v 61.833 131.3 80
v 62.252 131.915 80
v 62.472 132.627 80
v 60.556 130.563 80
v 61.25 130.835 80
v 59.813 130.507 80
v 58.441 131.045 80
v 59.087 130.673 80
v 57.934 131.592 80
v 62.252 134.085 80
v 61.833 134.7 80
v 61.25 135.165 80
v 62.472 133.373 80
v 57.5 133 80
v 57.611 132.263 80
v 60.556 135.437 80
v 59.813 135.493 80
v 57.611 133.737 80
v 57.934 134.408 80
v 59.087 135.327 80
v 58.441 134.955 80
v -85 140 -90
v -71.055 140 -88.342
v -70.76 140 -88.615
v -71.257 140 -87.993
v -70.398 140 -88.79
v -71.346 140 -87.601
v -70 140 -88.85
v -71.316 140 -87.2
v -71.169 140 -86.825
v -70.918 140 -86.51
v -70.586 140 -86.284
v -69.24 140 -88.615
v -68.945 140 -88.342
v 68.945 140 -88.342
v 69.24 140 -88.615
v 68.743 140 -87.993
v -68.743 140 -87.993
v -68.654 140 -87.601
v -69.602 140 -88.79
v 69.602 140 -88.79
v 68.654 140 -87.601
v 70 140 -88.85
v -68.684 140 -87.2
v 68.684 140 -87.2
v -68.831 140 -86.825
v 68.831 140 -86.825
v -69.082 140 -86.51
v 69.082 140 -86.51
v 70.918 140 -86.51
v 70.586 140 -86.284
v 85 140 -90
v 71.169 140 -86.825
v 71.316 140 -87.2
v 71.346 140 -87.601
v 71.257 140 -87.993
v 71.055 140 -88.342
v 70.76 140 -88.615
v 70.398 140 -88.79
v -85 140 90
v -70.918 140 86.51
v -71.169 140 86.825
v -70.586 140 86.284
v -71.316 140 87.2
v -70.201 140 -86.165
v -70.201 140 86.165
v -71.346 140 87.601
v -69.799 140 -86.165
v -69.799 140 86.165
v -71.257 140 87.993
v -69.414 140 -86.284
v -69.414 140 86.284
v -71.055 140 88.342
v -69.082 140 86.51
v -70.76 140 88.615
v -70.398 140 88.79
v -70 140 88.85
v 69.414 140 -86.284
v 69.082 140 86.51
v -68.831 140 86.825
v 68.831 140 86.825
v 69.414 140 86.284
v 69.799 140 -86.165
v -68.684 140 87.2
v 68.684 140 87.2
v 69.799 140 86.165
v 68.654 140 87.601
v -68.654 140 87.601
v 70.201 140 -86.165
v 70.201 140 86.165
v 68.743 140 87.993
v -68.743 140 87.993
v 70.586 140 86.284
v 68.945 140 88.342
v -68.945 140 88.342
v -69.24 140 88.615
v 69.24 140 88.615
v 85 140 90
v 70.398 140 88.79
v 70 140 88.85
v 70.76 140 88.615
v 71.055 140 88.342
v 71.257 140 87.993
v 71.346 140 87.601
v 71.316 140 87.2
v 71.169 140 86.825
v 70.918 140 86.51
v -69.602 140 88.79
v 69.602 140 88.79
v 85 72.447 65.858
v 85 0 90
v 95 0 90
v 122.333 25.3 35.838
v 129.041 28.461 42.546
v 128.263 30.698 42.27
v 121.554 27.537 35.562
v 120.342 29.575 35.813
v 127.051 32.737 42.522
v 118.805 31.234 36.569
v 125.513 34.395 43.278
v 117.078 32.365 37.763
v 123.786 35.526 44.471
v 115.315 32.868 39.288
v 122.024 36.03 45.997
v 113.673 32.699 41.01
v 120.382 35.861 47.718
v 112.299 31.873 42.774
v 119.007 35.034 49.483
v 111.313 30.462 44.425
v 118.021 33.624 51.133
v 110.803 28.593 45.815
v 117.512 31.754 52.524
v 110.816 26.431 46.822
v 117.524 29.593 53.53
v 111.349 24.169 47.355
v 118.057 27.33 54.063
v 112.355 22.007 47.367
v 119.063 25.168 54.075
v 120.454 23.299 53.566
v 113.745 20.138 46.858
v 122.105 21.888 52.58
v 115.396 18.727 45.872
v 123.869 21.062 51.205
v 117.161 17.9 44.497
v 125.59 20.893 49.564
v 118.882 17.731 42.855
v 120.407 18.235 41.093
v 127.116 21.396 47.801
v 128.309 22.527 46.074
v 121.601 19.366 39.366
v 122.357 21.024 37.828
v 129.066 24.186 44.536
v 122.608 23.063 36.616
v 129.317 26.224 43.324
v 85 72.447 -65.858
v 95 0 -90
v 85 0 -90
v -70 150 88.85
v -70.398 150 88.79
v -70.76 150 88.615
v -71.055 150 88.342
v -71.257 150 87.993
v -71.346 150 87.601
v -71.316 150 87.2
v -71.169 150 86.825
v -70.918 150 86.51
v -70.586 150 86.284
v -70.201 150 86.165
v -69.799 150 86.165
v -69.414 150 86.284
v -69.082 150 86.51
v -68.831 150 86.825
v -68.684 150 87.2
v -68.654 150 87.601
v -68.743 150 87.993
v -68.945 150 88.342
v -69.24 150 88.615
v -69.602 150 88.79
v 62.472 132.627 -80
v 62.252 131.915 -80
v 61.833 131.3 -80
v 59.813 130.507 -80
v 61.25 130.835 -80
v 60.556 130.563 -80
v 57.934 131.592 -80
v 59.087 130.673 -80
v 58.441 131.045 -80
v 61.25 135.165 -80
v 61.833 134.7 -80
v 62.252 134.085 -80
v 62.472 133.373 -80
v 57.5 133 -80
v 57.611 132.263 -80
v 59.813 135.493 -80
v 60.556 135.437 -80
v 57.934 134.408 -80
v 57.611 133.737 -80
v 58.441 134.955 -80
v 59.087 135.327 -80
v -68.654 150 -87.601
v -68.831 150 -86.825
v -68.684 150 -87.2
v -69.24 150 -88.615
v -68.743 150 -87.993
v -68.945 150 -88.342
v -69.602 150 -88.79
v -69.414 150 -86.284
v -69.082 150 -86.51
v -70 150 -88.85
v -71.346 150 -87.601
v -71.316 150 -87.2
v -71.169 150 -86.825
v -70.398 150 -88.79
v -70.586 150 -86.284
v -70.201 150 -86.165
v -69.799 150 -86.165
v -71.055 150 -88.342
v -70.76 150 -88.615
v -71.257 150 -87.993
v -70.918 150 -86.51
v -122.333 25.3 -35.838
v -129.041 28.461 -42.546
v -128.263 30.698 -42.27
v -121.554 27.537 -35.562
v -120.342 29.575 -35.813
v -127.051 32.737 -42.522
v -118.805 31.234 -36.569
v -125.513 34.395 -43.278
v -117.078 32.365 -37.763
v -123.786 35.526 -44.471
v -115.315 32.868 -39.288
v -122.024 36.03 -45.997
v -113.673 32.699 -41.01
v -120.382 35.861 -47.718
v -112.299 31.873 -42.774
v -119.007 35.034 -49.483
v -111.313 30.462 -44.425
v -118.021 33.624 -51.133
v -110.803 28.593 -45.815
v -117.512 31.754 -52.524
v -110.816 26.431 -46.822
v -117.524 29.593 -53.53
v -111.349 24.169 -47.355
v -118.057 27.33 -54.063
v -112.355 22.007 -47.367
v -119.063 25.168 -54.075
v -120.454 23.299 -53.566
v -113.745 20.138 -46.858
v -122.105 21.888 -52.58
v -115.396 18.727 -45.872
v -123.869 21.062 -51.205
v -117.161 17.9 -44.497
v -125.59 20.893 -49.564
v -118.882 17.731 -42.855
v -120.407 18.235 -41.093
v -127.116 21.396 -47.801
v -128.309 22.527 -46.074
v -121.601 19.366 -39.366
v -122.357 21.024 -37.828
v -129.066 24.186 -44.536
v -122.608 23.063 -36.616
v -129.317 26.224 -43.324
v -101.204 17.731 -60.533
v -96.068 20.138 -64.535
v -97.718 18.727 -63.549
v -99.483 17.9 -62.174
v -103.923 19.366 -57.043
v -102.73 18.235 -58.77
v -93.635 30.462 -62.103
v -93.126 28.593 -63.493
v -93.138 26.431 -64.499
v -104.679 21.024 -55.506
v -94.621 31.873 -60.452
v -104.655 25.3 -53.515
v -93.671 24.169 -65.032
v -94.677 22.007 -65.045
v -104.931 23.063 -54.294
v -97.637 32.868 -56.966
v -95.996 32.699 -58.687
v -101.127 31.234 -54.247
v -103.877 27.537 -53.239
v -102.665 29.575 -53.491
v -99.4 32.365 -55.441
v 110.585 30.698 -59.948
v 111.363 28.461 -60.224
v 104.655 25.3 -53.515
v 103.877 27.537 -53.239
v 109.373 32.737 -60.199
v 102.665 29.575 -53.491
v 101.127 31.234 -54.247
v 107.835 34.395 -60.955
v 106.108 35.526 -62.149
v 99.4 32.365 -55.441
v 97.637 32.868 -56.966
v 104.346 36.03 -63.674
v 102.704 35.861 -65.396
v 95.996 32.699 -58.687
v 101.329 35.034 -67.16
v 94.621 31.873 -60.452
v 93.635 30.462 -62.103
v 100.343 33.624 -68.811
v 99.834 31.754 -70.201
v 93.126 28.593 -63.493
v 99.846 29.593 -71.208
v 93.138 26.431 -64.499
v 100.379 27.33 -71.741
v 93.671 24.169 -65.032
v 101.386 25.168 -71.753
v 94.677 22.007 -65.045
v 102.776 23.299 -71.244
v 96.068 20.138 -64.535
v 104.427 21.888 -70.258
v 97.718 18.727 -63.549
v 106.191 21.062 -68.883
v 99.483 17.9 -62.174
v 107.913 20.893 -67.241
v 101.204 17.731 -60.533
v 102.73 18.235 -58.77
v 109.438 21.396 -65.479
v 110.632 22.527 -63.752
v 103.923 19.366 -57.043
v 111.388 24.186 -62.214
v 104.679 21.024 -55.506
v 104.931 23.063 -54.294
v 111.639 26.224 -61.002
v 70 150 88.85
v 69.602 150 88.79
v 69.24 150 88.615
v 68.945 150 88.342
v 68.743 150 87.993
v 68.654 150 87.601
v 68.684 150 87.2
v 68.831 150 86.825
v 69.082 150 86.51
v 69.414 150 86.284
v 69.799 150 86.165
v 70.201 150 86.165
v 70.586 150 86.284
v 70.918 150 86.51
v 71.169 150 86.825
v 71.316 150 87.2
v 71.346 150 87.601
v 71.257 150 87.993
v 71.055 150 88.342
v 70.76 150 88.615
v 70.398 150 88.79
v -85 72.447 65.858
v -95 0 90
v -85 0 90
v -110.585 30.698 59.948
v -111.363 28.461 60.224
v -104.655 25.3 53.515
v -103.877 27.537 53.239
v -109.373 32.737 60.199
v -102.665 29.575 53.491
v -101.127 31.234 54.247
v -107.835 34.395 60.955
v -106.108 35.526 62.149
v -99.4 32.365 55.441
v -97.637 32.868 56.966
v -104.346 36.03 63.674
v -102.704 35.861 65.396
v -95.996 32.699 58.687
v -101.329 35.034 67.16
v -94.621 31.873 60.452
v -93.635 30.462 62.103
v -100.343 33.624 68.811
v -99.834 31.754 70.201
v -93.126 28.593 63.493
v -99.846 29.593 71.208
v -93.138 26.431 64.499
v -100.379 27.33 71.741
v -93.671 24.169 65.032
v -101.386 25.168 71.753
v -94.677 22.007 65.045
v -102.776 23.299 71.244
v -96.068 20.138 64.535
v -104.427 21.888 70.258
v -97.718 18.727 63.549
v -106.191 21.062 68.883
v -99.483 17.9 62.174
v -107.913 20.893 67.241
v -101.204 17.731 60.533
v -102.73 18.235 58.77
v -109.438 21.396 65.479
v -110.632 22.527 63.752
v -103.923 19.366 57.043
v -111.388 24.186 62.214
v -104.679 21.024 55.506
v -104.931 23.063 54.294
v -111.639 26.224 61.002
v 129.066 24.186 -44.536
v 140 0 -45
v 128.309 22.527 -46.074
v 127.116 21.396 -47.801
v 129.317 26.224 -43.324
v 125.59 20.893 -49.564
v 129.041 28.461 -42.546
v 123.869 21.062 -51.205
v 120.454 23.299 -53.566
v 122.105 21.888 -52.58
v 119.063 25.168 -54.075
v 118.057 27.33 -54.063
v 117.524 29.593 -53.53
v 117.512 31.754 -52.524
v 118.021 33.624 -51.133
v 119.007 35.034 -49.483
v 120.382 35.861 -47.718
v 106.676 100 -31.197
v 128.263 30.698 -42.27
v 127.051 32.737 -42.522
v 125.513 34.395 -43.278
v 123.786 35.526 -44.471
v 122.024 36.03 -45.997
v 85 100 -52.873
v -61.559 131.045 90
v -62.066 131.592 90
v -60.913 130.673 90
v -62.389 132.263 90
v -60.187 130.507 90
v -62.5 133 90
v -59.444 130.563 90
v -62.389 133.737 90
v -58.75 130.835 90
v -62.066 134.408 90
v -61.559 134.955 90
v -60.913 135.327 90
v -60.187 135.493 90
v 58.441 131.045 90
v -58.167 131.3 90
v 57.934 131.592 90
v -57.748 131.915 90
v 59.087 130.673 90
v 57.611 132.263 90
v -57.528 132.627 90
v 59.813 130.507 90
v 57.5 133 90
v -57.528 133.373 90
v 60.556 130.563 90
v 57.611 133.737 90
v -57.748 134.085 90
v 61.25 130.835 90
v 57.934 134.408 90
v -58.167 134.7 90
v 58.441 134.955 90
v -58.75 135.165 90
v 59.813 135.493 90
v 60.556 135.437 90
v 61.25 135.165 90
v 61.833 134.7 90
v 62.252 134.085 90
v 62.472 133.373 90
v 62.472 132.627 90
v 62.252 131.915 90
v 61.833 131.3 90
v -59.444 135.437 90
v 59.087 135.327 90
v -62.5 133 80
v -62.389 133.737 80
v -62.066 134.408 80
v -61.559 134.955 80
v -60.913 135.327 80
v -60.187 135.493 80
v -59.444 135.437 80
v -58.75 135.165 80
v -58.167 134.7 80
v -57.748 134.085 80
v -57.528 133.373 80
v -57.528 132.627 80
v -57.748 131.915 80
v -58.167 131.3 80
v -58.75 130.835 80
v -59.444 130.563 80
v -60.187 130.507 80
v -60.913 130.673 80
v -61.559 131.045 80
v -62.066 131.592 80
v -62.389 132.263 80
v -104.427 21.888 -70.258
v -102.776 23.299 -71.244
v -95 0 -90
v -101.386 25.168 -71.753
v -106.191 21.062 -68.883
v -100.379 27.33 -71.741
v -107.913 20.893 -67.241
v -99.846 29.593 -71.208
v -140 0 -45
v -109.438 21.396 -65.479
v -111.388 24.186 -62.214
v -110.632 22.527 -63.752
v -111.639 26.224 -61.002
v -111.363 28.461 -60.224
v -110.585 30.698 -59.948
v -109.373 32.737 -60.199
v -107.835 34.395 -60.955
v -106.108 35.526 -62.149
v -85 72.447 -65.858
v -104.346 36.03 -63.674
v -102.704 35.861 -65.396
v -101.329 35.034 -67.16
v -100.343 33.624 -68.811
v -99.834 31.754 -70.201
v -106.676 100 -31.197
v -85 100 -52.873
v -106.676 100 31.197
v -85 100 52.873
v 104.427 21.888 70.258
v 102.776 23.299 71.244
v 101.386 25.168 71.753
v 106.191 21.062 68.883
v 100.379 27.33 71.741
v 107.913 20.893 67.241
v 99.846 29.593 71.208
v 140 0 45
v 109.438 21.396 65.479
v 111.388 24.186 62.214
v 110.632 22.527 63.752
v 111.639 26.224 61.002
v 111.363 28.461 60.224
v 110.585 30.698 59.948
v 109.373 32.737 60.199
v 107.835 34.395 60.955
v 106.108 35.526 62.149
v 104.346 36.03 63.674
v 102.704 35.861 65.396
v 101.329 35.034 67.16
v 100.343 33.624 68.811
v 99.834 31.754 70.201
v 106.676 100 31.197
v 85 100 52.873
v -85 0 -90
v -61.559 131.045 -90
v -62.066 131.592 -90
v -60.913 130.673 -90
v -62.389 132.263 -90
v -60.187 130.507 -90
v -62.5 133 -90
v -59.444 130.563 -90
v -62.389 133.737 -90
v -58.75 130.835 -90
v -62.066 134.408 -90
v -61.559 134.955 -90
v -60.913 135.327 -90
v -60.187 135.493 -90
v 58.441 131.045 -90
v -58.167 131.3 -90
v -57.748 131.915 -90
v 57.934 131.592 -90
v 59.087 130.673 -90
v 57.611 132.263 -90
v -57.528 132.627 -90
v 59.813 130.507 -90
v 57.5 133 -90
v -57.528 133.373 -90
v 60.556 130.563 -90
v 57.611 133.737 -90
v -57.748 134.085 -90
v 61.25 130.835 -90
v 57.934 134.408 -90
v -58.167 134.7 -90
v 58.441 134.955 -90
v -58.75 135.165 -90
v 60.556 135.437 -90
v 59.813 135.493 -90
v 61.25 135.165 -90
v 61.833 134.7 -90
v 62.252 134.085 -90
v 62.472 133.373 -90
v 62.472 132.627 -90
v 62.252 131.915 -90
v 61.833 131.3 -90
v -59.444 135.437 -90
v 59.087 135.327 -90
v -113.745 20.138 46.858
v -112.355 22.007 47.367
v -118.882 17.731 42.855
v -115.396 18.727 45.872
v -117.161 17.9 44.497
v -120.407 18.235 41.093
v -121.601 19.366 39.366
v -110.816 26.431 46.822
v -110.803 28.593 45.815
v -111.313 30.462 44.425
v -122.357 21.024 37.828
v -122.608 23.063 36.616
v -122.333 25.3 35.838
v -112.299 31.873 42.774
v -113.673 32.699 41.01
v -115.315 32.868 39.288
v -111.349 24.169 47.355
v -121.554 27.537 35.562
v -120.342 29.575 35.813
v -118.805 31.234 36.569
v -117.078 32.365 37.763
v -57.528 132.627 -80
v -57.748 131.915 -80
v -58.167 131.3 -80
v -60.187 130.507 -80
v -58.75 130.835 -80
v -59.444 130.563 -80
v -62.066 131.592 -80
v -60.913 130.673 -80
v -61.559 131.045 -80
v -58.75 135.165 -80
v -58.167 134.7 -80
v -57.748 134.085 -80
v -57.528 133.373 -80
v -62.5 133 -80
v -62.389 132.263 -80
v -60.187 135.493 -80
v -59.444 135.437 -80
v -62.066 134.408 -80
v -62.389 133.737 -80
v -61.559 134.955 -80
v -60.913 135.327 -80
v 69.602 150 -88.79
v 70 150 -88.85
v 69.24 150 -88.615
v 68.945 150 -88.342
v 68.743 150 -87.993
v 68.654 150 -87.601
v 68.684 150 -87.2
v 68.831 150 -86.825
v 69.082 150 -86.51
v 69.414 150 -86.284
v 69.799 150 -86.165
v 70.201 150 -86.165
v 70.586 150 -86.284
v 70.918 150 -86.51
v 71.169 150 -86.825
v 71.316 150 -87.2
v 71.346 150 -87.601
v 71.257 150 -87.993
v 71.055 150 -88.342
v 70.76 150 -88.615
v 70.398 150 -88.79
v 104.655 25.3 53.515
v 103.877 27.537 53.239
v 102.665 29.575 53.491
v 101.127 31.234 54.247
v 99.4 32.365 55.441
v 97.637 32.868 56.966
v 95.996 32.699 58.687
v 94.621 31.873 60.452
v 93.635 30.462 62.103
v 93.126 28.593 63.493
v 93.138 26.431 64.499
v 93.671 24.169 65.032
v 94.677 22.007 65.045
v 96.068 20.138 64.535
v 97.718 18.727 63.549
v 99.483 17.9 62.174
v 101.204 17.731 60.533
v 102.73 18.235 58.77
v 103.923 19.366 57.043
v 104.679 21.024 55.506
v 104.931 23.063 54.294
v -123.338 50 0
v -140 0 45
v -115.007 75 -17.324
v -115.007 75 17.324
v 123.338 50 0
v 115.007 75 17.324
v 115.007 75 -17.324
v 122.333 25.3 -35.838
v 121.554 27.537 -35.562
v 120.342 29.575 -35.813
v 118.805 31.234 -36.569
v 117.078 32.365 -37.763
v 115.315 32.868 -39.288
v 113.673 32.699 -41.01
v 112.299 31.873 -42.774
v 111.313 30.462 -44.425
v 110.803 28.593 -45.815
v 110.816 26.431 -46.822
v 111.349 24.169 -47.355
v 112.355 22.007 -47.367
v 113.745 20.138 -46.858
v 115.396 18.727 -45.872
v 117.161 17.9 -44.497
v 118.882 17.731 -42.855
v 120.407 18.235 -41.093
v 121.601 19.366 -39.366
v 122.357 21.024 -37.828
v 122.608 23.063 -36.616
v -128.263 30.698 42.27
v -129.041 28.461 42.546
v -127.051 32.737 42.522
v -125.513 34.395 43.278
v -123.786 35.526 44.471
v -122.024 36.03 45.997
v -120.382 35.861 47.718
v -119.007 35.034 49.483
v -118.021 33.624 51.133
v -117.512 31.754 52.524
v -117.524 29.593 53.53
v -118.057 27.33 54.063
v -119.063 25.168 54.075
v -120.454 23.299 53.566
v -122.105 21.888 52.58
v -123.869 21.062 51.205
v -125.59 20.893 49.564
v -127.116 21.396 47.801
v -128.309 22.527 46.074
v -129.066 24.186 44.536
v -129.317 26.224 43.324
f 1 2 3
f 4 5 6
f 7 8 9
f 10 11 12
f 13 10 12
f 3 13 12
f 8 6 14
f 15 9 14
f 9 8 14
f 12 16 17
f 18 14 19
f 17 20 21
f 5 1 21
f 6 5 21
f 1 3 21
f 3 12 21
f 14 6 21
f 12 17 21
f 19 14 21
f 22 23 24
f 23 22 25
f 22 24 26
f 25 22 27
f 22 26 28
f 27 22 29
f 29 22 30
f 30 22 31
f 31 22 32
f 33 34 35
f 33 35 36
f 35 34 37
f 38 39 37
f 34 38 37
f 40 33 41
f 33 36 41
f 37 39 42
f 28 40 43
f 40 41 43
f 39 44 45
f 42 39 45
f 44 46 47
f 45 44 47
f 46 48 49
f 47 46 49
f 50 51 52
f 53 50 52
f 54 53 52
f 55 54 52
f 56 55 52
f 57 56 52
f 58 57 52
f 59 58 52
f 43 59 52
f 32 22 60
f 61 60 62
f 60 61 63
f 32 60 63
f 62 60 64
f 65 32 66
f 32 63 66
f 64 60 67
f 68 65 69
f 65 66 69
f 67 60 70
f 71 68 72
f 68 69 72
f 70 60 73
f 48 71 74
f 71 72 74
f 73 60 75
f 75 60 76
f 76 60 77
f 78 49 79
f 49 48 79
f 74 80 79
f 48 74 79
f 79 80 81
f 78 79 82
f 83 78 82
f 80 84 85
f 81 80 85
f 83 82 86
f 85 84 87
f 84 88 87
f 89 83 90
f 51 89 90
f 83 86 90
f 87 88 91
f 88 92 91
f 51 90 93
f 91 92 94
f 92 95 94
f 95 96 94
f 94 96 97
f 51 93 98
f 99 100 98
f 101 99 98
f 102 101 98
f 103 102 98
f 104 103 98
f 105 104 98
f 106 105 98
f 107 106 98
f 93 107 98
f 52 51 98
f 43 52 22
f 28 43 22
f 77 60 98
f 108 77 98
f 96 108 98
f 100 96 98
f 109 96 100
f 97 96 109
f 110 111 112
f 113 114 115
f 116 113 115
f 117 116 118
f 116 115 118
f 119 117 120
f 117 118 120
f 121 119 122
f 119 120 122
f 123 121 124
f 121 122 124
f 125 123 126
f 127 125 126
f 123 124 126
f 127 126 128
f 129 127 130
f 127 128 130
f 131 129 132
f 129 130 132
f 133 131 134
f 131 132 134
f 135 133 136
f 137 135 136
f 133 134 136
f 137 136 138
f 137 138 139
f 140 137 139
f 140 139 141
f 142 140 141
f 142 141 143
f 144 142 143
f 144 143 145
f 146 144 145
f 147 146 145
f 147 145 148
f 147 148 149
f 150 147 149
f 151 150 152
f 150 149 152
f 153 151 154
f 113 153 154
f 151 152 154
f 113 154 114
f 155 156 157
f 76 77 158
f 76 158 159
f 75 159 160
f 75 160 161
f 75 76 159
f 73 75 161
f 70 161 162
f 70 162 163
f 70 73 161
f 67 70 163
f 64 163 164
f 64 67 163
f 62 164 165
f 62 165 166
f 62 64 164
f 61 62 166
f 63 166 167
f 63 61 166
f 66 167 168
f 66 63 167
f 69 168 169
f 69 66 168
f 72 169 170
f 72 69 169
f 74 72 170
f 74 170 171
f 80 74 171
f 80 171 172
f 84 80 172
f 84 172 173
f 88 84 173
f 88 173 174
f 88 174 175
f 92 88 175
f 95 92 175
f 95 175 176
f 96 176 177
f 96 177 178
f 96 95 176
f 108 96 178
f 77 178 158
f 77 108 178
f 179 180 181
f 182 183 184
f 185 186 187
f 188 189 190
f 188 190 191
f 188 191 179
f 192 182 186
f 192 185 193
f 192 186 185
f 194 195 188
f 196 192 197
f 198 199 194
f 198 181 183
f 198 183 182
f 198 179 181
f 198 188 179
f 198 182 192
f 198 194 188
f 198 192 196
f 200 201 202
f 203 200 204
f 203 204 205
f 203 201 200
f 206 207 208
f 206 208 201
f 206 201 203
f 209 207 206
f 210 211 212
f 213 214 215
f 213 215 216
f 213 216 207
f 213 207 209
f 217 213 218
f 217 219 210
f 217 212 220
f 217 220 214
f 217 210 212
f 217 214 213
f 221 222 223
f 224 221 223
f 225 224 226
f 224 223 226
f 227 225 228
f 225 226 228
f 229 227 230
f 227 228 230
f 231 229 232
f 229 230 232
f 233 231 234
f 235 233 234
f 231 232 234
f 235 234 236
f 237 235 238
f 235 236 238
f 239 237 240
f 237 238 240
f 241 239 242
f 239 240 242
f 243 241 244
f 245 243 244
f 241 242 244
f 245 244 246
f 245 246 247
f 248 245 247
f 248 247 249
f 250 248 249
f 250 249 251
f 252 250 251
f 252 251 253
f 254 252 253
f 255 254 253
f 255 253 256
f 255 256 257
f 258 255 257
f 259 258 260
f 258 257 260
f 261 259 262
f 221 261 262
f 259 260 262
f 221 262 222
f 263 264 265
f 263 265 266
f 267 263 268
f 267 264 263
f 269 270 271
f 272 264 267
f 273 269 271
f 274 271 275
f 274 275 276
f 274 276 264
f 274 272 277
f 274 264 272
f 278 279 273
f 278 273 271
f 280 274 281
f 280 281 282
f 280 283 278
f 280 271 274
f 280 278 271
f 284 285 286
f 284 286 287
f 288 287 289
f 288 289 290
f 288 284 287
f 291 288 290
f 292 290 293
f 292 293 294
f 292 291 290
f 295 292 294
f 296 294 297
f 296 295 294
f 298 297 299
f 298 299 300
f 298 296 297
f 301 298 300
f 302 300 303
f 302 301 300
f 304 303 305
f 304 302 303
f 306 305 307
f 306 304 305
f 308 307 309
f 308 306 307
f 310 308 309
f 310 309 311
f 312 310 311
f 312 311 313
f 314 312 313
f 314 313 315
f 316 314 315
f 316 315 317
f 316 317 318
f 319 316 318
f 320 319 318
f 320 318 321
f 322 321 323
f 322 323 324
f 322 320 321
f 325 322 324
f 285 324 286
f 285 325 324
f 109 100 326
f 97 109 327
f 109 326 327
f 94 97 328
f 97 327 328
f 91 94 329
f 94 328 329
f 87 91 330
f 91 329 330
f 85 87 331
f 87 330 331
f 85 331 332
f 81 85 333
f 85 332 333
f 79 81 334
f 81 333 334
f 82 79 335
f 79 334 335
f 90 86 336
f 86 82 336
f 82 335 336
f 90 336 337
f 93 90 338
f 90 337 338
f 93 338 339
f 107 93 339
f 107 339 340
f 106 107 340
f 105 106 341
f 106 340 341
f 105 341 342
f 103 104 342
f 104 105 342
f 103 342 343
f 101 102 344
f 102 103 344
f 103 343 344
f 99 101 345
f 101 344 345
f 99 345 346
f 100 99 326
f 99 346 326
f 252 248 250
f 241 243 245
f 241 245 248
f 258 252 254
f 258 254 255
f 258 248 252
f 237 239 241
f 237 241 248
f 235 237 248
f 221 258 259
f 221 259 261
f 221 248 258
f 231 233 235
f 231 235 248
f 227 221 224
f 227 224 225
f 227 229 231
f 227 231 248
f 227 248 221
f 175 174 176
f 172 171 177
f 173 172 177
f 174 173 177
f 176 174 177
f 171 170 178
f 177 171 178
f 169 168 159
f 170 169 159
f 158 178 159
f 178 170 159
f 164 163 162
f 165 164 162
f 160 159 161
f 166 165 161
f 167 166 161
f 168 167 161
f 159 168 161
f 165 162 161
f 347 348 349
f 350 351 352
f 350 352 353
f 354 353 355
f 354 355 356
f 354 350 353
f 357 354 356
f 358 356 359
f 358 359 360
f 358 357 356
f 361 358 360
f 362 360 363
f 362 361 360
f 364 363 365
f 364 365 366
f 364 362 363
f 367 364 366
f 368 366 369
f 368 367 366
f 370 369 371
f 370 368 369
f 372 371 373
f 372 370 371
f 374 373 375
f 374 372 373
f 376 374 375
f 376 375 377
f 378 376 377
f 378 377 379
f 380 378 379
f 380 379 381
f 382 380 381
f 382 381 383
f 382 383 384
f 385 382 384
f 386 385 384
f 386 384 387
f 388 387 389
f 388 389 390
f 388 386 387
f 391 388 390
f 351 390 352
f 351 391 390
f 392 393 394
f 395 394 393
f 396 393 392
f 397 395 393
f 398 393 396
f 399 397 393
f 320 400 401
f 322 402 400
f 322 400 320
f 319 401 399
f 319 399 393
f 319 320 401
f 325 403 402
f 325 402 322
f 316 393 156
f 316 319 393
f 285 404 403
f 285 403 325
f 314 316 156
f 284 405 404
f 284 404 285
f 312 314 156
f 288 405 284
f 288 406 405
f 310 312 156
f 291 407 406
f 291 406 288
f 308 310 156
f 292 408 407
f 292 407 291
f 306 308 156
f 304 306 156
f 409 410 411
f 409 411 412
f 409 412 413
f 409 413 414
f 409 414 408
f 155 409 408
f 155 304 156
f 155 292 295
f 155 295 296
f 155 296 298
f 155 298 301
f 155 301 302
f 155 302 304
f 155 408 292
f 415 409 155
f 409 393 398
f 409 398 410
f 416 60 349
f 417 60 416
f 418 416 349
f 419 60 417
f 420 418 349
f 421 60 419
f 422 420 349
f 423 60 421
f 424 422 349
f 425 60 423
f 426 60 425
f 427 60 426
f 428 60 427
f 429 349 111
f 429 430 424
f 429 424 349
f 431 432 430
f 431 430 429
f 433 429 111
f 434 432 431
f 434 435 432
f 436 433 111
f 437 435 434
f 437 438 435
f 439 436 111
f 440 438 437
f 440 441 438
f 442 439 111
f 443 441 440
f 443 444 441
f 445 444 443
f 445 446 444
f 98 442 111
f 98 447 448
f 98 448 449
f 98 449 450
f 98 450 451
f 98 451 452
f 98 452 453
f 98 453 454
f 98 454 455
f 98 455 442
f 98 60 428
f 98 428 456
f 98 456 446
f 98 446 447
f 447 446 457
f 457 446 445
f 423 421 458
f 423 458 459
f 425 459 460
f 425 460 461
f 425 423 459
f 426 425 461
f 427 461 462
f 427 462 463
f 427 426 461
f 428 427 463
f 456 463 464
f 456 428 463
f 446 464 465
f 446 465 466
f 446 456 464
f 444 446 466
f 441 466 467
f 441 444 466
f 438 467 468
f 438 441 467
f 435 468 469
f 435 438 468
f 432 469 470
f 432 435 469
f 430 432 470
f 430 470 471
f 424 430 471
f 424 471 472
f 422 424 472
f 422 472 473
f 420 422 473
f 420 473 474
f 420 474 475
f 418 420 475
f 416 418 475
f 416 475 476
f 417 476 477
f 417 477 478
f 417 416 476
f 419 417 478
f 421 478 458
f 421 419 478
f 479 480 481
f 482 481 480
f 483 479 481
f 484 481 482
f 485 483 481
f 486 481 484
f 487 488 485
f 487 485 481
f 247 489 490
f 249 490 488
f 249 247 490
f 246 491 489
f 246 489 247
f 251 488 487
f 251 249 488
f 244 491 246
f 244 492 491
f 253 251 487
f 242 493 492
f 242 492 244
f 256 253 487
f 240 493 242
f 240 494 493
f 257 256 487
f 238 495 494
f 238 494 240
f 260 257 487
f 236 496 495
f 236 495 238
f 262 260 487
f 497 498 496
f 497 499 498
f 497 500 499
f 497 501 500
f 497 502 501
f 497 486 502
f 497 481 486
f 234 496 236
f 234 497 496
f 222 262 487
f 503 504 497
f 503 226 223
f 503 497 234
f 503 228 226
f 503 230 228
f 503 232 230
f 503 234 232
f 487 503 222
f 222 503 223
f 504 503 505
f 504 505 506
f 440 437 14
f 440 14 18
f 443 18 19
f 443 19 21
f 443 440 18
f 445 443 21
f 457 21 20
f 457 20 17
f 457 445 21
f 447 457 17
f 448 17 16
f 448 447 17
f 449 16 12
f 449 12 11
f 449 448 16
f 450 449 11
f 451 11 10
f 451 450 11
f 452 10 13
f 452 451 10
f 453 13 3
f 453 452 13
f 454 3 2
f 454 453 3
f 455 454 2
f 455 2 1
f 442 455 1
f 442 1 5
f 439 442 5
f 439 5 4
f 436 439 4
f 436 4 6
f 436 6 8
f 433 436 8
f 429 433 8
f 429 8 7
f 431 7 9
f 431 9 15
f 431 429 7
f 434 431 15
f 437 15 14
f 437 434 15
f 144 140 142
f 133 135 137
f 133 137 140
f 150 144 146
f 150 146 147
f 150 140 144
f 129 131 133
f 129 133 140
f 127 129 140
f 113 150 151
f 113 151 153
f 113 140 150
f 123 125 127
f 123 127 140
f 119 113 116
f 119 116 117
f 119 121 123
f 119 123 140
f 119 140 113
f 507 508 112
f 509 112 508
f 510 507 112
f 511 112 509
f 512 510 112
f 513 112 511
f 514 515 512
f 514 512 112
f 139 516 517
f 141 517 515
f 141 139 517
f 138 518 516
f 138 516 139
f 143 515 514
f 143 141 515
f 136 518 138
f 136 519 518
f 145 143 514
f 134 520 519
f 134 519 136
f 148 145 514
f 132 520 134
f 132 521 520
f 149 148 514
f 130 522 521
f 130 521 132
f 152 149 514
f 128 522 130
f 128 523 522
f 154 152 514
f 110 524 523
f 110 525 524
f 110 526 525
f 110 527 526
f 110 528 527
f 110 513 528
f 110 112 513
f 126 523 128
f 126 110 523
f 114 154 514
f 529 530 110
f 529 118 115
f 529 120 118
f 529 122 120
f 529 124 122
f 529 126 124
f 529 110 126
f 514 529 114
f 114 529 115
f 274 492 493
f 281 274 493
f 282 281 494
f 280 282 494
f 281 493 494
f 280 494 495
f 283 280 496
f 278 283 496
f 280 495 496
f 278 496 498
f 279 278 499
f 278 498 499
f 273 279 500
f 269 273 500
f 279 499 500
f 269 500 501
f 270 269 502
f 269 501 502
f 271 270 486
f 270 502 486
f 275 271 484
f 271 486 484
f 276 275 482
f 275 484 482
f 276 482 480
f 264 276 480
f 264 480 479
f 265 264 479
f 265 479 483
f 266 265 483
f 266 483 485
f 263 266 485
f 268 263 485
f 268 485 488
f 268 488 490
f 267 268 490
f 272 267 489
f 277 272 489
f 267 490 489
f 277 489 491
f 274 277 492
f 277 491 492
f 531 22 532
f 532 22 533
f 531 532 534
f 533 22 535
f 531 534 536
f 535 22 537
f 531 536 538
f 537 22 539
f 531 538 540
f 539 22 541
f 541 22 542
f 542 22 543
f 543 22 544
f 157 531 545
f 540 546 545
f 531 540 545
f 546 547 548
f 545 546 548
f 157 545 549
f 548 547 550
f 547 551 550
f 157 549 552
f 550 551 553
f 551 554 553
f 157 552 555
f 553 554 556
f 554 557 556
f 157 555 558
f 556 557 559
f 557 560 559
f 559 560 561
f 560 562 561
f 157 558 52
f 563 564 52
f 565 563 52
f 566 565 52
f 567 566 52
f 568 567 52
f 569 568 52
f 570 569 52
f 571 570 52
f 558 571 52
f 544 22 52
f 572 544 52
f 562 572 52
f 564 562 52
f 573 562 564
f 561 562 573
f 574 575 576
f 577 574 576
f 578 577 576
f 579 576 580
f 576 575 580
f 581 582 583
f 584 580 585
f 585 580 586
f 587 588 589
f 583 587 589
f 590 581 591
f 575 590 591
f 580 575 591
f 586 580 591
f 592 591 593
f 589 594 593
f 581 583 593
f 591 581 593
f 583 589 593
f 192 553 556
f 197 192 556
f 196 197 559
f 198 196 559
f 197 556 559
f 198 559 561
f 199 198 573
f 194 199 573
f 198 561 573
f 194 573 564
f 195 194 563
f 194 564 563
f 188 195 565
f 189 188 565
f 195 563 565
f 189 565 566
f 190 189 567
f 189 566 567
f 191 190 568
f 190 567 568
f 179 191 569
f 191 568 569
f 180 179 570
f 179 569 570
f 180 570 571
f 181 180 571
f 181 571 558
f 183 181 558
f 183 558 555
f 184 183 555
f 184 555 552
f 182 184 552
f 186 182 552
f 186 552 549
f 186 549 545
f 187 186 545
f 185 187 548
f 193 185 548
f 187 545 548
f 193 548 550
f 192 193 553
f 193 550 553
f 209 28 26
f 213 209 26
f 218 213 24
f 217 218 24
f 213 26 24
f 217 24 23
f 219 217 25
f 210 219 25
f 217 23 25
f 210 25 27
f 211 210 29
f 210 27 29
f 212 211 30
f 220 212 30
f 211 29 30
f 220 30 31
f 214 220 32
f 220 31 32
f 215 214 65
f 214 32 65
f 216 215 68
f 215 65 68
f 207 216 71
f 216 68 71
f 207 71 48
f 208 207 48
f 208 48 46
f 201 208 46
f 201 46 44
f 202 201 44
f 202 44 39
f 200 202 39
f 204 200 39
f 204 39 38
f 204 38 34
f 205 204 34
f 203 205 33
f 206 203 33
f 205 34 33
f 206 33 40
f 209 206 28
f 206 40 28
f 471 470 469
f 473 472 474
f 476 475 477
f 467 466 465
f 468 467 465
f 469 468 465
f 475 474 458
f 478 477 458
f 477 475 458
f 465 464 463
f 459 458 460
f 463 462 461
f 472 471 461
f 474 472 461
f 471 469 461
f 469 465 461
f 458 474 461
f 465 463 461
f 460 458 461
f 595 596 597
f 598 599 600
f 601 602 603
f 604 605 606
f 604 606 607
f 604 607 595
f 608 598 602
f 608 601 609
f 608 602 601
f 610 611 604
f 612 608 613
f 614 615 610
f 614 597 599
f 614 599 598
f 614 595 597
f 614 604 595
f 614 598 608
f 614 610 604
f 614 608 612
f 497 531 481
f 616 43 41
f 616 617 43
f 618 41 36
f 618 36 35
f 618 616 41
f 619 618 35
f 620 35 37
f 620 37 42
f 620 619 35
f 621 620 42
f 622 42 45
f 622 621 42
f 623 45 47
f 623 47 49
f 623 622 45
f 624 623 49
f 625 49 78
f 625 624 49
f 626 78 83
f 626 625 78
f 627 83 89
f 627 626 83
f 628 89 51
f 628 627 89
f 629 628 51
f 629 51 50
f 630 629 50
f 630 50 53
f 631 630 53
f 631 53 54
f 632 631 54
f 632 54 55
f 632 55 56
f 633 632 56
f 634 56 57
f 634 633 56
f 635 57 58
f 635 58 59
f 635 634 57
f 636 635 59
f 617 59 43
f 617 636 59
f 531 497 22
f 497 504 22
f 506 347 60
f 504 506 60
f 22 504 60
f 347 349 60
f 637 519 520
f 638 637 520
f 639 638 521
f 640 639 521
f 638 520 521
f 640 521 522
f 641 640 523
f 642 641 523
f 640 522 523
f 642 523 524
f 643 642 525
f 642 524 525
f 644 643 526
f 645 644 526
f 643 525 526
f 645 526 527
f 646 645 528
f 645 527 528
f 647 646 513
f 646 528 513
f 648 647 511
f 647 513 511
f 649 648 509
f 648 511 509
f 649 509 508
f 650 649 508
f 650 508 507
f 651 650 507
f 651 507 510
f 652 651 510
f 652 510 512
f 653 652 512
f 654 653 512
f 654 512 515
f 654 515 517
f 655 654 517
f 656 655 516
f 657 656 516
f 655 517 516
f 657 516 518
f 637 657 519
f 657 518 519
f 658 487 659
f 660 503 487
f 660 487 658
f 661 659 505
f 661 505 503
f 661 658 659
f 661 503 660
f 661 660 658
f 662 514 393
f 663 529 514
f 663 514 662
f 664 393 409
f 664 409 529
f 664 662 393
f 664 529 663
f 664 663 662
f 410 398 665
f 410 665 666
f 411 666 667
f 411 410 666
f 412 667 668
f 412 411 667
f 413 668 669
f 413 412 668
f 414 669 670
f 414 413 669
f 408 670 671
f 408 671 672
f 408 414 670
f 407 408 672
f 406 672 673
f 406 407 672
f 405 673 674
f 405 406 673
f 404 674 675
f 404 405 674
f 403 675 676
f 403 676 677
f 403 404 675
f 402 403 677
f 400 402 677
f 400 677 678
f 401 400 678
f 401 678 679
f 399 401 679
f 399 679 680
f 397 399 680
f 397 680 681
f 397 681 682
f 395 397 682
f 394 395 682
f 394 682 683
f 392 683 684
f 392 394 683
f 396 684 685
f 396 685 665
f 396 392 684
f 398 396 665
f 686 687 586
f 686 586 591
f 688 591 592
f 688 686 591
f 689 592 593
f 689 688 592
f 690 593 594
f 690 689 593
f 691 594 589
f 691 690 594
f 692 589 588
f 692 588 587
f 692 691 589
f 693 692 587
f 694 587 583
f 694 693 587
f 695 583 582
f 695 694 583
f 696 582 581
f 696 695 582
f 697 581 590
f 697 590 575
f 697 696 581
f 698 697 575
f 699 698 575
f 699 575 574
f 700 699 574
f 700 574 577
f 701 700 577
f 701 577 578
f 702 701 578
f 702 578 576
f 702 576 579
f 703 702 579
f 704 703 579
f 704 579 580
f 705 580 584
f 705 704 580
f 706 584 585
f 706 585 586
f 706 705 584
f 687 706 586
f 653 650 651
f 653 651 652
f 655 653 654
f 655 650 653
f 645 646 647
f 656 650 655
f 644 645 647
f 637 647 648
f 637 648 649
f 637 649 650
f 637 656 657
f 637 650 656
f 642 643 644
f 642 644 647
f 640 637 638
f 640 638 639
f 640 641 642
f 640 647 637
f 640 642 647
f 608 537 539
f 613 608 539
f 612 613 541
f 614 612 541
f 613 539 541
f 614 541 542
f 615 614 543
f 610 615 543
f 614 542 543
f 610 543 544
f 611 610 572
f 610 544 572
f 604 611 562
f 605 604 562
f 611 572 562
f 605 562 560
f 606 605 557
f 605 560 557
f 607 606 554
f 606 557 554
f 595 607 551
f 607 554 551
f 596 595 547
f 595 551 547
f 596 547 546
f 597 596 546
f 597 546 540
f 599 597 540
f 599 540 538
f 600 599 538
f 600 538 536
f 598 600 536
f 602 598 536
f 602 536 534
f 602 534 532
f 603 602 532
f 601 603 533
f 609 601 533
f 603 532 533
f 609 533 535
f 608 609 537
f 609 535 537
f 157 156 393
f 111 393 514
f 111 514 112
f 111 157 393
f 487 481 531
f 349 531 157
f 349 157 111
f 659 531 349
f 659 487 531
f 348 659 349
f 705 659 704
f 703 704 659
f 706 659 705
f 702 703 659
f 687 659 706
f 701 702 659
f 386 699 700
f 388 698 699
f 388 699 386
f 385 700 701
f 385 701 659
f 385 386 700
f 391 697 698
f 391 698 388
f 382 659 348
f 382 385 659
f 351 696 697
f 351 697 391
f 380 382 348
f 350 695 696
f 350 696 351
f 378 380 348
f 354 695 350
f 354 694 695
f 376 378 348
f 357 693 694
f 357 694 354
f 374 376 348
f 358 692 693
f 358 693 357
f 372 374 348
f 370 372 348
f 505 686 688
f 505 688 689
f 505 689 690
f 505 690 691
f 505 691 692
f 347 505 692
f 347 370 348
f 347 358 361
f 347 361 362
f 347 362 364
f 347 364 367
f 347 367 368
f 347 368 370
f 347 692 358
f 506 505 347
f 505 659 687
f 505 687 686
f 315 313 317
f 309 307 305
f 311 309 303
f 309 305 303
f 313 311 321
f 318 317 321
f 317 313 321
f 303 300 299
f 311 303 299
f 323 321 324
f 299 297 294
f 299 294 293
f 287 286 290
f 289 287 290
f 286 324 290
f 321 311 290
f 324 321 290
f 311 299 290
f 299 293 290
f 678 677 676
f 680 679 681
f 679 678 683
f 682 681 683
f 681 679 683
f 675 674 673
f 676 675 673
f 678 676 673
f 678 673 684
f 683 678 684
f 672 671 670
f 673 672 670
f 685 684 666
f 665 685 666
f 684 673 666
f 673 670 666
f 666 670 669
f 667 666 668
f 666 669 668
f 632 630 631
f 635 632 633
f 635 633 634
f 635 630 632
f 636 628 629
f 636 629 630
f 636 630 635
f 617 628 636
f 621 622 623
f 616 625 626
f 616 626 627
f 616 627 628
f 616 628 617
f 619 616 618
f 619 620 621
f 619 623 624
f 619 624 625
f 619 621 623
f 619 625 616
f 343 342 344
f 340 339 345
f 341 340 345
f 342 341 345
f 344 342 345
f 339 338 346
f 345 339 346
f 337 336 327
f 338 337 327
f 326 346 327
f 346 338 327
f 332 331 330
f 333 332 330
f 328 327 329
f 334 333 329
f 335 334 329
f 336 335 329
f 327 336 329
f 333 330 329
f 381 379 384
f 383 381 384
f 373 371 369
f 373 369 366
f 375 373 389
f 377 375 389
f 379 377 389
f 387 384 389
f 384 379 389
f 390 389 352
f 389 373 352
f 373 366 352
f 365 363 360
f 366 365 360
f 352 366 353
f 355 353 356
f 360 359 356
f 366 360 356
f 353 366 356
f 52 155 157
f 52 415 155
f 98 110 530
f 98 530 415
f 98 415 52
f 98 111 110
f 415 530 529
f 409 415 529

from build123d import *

# Parameters (mm, degrees)
BOSS_EXTRUDE1_DEPTH     = 100
BOSS_EXTRUDE1_TAPER     = 18.43
SKETCH2_W               = 170
SKETCH2_H               = 190
BOSS_EXTRUDE2_DEPTH     = 90
SKETCH3_R               = 1.35
BOSS_EXTRUDE3_DEPTH     = 10
SKETCH4_W               = 180
SKETCH4_H               = 50
CUT_EXTRUDE1_DEPTH      = 286.000000111
SKETCH5_R               = 2.5
CUT_EXTRUDE2_DEPTH      = 10
SKETCH6_R               = 8
CUT_EXTRUDE3_DEPTH      = 10
MIRROR4_COPY_1_SKETCH_R = 8
MIRROR4_COPY_1_DEPTH    = 10


with BuildPart() as part:
    # Sketch1 → Boss-Extrude1 (new body)
    with BuildSketch(Plane(origin=(0, 0, 0), x_dir=(1, 0, 0), z_dir=(0, 1, 0))):
        Polygon((-140, -45), (-125, -60), (-95, -90), (95, -90), (140, -45), (140, 45), (95, 90), (-95, 90), (-140, 45), align=None)
    extrude(amount=BOSS_EXTRUDE1_DEPTH, taper=BOSS_EXTRUDE1_TAPER)

    # Sketch2 → Boss-Extrude2 (add, symmetric)
    with BuildSketch(Plane.XY):
        with Locations((0, 45)):
            Rectangle(SKETCH2_W, SKETCH2_H)
    extrude(amount=BOSS_EXTRUDE2_DEPTH, both=True)

    # Sketch3 → Boss-Extrude3 (add, symmetric)
    with BuildSketch(Plane(origin=(0, 140, 0), x_dir=(1, 0, 0), z_dir=(0, 1, 0))):
        with Locations(Location((-70, 87.5, 0), (0, 0, 90))):
            Circle(SKETCH3_R)
        with Locations(Location((70, 87.5, 0), (0, 0, 90))):
            Circle(SKETCH3_R)
    boss_extrude3 = extrude(amount=BOSS_EXTRUDE3_DEPTH, both=True)

    # Mirror1: Boss-Extrude3 across plane
    add(boss_extrude3.mirror(Plane.XY))

    # Sketch4 → Cut-Extrude1 (cut, through all)
    with BuildSketch(Plane.ZY.offset(85)):
        with Locations((0, -25)):
            Rectangle(SKETCH4_W, SKETCH4_H)
    extrude(amount=-CUT_EXTRUDE1_DEPTH, mode=Mode.SUBTRACT)

    # Sketch5 → Cut-Extrude2 (cut)
    with BuildSketch(Plane(origin=(0, 0, -90), x_dir=(-1, 0, 0), z_dir=(0, 0, -1))):
        with Locations((-60, 133)):
            Circle(SKETCH5_R)
        with Locations((60, 133)):
            Circle(SKETCH5_R)
    cut_extrude2 = extrude(amount=-CUT_EXTRUDE2_DEPTH, mode=Mode.SUBTRACT)

    # Mirror2: Cut-Extrude2 across plane
    add(cut_extrude2.mirror(Plane.XY), mode=Mode.SUBTRACT)

    # Sketch6 → Cut-Extrude3 (cut)
    with BuildSketch(Plane(origin=(-83.254793164, 39.235386654, -83.254793164), x_dir=(-0.6068291050905237, 0.2859796255102721, 0.741602380665029), z_dir=(-0.6708397043943968, 0.31614582397380636, -0.6708397043943966))):
        with Locations(Location((23.427974197, -19.317213572, 0), (0, 0, 342.455867608))):
            Circle(SKETCH6_R)
        with Locations(Location((47.265100386, -26.853221472, 0), (0, 0, 342.455867608))):
            Circle(SKETCH6_R)
    cut_extrude3 = extrude(amount=-CUT_EXTRUDE3_DEPTH, mode=Mode.SUBTRACT)

    # Mirror3: Cut-Extrude3 across plane
    add(cut_extrude3.mirror(Plane.XY), mode=Mode.SUBTRACT)

    # Mirror4: Cut-Extrude3 across plane
    add(cut_extrude3.mirror(Plane(origin=(0, 0, 0), x_dir=(0, 0, 1), z_dir=(1, 0, 0))), mode=Mode.SUBTRACT)

    # Mirror4 copy 1 sketch → Mirror4 copy 1 (cut)
    with BuildSketch(Plane(origin=(83.254793164, 39.235386654, 83.254793164), x_dir=(0.6068291050905237, 0.2859796255102721, -0.741602380665029), z_dir=(0.6708397043943968, 0.31614582397380636, 0.6708397043943966))):
        with Locations(Location((23.427974197, -19.317213572, 0), (0, 0, 342.455867608))):
            Circle(MIRROR4_COPY_1_SKETCH_R)
        with Locations(Location((47.265100386, -26.853221472, 0), (0, 0, 342.455867608))):
            Circle(MIRROR4_COPY_1_SKETCH_R)
    extrude(amount=-MIRROR4_COPY_1_DEPTH, mode=Mode.SUBTRACT)


solid = part.part
